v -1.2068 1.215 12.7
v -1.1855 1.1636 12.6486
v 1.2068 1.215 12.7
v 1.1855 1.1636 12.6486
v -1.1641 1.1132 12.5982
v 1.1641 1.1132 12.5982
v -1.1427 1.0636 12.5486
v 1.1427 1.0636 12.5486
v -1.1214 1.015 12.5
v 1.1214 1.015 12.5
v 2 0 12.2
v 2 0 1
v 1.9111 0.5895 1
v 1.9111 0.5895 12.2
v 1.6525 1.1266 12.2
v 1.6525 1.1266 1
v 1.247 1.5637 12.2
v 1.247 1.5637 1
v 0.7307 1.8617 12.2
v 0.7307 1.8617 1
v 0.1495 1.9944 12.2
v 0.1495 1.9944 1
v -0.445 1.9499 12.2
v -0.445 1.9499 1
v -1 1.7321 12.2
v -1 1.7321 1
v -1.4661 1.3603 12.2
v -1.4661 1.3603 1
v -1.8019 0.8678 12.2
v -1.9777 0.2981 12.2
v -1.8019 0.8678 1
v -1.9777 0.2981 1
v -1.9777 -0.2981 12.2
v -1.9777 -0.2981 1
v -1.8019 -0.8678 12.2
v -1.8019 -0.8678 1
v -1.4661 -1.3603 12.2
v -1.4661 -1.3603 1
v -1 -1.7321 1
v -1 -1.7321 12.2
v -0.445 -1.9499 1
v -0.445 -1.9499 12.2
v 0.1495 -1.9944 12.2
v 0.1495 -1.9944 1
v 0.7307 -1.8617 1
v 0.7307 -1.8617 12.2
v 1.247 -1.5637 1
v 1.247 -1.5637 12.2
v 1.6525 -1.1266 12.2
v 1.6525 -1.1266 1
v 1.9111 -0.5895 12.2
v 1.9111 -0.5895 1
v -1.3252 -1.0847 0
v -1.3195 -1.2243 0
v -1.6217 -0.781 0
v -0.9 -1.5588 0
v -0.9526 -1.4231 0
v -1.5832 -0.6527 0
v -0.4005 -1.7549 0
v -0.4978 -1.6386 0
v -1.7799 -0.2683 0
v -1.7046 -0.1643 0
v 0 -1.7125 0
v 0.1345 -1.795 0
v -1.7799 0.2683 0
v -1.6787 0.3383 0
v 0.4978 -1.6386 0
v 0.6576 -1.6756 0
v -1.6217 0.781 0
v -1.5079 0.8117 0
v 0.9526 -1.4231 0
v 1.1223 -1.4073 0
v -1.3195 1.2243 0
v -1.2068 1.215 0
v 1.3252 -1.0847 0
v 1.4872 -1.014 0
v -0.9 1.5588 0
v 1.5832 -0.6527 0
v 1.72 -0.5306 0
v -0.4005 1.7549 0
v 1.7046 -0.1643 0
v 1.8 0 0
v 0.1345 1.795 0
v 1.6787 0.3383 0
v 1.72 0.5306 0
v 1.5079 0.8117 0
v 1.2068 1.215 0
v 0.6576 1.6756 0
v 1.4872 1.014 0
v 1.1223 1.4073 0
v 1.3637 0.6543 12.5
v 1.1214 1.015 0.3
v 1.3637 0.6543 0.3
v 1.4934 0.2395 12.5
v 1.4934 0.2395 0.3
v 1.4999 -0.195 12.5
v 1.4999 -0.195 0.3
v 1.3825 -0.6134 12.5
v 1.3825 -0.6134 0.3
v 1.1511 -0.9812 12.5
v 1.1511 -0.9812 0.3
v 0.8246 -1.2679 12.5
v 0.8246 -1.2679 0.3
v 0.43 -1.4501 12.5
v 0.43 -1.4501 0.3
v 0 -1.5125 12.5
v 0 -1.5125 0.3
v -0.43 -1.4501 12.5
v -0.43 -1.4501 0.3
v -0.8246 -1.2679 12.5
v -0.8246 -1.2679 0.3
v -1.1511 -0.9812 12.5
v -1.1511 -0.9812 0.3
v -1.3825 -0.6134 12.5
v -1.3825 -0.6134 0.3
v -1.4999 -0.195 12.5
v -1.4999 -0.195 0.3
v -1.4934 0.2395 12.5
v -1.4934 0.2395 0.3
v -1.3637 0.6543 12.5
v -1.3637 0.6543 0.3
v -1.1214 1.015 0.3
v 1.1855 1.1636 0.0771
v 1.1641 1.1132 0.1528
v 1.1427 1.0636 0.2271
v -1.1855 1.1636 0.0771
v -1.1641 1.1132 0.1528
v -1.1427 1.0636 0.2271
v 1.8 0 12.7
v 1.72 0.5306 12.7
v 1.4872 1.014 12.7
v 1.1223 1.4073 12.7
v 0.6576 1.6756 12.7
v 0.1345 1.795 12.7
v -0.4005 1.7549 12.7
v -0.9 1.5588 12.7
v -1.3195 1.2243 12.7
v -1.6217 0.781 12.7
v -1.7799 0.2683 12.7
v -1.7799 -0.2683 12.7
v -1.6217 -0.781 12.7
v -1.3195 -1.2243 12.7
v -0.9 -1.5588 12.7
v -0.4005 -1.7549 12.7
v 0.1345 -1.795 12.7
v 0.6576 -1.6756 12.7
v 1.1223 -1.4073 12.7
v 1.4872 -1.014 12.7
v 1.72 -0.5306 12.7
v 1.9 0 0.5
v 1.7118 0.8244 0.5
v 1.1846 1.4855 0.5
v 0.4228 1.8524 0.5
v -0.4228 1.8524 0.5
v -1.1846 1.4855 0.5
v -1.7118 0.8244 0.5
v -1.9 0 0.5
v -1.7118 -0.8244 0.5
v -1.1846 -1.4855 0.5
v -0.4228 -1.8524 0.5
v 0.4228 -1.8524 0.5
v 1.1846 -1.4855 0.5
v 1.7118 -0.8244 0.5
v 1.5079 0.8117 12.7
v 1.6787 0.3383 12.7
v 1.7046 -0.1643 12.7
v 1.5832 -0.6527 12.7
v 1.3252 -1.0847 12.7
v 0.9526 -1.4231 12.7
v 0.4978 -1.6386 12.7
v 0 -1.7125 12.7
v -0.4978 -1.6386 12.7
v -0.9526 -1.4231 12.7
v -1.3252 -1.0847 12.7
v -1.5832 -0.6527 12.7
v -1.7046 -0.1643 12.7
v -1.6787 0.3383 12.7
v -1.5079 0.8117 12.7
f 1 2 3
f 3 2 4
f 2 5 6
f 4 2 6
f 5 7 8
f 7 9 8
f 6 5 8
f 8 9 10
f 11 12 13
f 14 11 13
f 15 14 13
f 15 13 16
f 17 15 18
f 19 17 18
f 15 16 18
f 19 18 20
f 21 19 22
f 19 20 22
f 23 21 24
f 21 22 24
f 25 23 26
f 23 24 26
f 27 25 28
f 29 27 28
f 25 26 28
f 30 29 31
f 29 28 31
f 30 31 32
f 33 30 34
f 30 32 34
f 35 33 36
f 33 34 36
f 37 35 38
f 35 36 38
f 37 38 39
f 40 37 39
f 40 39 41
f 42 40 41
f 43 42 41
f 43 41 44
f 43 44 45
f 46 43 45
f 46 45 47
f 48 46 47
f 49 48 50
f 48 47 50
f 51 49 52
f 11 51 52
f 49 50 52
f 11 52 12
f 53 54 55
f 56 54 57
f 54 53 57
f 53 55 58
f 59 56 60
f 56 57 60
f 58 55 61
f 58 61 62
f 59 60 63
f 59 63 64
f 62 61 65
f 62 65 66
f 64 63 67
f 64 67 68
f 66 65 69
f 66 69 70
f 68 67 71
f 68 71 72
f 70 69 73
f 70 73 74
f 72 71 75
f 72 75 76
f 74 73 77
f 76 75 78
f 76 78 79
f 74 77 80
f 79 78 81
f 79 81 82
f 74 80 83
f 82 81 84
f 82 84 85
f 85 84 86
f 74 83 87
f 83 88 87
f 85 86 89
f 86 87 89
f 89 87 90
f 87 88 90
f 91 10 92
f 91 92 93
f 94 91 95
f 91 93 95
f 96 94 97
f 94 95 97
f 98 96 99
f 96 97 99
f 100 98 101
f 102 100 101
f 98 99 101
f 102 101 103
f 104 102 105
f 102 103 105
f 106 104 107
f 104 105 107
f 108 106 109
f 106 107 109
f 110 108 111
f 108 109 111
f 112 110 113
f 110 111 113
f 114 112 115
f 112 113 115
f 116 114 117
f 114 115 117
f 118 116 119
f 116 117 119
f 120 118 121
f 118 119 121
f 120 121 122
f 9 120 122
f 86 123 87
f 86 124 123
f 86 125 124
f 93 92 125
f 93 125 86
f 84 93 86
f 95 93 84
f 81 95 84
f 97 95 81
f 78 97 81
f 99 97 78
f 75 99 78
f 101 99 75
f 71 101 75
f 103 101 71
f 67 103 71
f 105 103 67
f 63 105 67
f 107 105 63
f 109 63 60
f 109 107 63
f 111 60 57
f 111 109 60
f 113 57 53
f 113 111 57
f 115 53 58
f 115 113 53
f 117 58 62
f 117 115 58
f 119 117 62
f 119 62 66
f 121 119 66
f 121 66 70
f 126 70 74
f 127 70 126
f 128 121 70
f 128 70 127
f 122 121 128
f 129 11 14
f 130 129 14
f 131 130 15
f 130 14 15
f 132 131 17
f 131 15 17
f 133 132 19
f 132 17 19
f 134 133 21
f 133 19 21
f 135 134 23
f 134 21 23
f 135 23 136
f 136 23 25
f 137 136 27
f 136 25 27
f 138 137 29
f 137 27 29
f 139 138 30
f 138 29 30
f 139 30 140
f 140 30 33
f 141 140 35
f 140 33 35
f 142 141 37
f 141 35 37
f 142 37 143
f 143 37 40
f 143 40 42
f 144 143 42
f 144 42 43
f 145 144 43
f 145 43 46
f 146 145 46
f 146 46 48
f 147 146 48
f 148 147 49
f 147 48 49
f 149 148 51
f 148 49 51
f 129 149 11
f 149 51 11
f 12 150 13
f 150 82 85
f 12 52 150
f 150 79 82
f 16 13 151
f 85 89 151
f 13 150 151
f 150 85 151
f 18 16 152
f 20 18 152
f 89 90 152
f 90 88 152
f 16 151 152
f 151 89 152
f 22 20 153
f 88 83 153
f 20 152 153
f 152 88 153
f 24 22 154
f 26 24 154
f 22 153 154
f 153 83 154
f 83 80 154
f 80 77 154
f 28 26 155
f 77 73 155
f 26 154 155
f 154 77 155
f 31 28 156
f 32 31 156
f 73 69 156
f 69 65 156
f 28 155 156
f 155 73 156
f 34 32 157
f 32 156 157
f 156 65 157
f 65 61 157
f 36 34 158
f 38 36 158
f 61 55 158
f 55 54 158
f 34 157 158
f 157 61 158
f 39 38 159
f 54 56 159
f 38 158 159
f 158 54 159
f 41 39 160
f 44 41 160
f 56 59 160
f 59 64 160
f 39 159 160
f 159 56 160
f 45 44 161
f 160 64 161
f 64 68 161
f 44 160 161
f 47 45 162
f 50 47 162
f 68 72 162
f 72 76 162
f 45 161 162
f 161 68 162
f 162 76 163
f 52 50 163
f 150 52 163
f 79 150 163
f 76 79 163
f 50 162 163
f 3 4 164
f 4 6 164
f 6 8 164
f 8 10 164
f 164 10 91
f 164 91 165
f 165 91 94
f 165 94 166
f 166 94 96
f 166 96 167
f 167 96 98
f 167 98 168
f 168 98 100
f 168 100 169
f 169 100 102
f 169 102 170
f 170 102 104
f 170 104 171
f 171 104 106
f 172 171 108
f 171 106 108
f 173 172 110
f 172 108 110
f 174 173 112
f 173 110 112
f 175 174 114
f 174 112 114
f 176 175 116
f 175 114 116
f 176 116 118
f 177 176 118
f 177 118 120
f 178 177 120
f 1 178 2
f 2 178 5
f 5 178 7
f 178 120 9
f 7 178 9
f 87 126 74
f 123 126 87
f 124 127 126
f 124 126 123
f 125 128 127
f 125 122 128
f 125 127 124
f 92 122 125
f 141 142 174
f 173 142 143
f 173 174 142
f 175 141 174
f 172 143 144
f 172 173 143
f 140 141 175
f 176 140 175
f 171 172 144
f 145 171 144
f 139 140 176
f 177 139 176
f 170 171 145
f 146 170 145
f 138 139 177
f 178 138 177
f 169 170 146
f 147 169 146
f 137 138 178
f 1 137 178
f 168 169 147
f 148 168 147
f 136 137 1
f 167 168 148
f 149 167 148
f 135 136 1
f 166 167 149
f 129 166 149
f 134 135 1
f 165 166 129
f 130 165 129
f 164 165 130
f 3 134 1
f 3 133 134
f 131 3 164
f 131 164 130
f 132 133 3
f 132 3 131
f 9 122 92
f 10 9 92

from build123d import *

# Parameters (mm, degrees)
F0_R     = 2
F1_DEPTH = 12.7
F2_SIZE2 = 0.2
F2_SIZE  = 1
F3_SIZE2 = 0.5
F3_SIZE  = 0.2
F4_SIZE  = 0.2
F5_SIZE2 = 0.3
F5_SIZE  = 0.2


with BuildPart() as f1:
    # F0 (on Top) → F1 (new body)
    with BuildSketch(Plane.XY):
        Circle(F0_R)
        with BuildLine():
            ThreePointArc((1.1213524201, 1.015), (1.411329477, 0.5438799108), (1.5125, 0))
            ThreePointArc((1.5125, 0), (-0.5438799108, -1.411329477), (-1.1213524201, 1.015))
            ThreePointArc((-1.1213524201, 1.015), (0, 1.5125), (1.1213524201, 1.015))
        make_face(mode=Mode.SUBTRACT)
        with BuildLine():
            Line((0, 1.015), (1.1213524201, 1.015))
            ThreePointArc((1.1213524201, 1.015), (0, 1.5125), (-1.1213524201, 1.015))
            Line((-1.1213524201, 1.015), (0, 1.015))
        make_face()
    extrude(amount=F1_DEPTH)

    # F2
    f2_edges = [f1.edges().sort_by_distance(p)[0] for p in [
        (-2, 0, 0),
    ]]
    f2_side = f1.faces().sort_by_distance((-2, 0, 6.35))[0]
    chamfer(f2_edges, length=F2_SIZE, length2=F2_SIZE2, reference=f2_side)

    # F3
    f3_edges = [f1.edges().sort_by_distance(p)[0] for p in [
        (-2, 0, 12.7),
    ]]
    f3_side = f1.faces().sort_by_distance((-1.943431, 0, 12.7))[0]
    chamfer(f3_edges, length=F3_SIZE, length2=F3_SIZE2, reference=f3_side)

    # F4
    f4_edges = [f1.edges().sort_by_distance(p)[0] for p in [
        (0, 1.015, 12.7),
        (0, -1.5125, 12.7),
    ]]
    chamfer(f4_edges, length=F4_SIZE)

    # F5
    f5_edges = [f1.edges().sort_by_distance(p)[0] for p in [
        (0, -1.5125, 0),
        (0, 1.015, 0),
    ]]
    f5_side = f1.faces().sort_by_distance((-1.749088, 0, 0))[0]
    chamfer(f5_edges, length=F5_SIZE, length2=F5_SIZE2, reference=f5_side)


solid = f1.part
